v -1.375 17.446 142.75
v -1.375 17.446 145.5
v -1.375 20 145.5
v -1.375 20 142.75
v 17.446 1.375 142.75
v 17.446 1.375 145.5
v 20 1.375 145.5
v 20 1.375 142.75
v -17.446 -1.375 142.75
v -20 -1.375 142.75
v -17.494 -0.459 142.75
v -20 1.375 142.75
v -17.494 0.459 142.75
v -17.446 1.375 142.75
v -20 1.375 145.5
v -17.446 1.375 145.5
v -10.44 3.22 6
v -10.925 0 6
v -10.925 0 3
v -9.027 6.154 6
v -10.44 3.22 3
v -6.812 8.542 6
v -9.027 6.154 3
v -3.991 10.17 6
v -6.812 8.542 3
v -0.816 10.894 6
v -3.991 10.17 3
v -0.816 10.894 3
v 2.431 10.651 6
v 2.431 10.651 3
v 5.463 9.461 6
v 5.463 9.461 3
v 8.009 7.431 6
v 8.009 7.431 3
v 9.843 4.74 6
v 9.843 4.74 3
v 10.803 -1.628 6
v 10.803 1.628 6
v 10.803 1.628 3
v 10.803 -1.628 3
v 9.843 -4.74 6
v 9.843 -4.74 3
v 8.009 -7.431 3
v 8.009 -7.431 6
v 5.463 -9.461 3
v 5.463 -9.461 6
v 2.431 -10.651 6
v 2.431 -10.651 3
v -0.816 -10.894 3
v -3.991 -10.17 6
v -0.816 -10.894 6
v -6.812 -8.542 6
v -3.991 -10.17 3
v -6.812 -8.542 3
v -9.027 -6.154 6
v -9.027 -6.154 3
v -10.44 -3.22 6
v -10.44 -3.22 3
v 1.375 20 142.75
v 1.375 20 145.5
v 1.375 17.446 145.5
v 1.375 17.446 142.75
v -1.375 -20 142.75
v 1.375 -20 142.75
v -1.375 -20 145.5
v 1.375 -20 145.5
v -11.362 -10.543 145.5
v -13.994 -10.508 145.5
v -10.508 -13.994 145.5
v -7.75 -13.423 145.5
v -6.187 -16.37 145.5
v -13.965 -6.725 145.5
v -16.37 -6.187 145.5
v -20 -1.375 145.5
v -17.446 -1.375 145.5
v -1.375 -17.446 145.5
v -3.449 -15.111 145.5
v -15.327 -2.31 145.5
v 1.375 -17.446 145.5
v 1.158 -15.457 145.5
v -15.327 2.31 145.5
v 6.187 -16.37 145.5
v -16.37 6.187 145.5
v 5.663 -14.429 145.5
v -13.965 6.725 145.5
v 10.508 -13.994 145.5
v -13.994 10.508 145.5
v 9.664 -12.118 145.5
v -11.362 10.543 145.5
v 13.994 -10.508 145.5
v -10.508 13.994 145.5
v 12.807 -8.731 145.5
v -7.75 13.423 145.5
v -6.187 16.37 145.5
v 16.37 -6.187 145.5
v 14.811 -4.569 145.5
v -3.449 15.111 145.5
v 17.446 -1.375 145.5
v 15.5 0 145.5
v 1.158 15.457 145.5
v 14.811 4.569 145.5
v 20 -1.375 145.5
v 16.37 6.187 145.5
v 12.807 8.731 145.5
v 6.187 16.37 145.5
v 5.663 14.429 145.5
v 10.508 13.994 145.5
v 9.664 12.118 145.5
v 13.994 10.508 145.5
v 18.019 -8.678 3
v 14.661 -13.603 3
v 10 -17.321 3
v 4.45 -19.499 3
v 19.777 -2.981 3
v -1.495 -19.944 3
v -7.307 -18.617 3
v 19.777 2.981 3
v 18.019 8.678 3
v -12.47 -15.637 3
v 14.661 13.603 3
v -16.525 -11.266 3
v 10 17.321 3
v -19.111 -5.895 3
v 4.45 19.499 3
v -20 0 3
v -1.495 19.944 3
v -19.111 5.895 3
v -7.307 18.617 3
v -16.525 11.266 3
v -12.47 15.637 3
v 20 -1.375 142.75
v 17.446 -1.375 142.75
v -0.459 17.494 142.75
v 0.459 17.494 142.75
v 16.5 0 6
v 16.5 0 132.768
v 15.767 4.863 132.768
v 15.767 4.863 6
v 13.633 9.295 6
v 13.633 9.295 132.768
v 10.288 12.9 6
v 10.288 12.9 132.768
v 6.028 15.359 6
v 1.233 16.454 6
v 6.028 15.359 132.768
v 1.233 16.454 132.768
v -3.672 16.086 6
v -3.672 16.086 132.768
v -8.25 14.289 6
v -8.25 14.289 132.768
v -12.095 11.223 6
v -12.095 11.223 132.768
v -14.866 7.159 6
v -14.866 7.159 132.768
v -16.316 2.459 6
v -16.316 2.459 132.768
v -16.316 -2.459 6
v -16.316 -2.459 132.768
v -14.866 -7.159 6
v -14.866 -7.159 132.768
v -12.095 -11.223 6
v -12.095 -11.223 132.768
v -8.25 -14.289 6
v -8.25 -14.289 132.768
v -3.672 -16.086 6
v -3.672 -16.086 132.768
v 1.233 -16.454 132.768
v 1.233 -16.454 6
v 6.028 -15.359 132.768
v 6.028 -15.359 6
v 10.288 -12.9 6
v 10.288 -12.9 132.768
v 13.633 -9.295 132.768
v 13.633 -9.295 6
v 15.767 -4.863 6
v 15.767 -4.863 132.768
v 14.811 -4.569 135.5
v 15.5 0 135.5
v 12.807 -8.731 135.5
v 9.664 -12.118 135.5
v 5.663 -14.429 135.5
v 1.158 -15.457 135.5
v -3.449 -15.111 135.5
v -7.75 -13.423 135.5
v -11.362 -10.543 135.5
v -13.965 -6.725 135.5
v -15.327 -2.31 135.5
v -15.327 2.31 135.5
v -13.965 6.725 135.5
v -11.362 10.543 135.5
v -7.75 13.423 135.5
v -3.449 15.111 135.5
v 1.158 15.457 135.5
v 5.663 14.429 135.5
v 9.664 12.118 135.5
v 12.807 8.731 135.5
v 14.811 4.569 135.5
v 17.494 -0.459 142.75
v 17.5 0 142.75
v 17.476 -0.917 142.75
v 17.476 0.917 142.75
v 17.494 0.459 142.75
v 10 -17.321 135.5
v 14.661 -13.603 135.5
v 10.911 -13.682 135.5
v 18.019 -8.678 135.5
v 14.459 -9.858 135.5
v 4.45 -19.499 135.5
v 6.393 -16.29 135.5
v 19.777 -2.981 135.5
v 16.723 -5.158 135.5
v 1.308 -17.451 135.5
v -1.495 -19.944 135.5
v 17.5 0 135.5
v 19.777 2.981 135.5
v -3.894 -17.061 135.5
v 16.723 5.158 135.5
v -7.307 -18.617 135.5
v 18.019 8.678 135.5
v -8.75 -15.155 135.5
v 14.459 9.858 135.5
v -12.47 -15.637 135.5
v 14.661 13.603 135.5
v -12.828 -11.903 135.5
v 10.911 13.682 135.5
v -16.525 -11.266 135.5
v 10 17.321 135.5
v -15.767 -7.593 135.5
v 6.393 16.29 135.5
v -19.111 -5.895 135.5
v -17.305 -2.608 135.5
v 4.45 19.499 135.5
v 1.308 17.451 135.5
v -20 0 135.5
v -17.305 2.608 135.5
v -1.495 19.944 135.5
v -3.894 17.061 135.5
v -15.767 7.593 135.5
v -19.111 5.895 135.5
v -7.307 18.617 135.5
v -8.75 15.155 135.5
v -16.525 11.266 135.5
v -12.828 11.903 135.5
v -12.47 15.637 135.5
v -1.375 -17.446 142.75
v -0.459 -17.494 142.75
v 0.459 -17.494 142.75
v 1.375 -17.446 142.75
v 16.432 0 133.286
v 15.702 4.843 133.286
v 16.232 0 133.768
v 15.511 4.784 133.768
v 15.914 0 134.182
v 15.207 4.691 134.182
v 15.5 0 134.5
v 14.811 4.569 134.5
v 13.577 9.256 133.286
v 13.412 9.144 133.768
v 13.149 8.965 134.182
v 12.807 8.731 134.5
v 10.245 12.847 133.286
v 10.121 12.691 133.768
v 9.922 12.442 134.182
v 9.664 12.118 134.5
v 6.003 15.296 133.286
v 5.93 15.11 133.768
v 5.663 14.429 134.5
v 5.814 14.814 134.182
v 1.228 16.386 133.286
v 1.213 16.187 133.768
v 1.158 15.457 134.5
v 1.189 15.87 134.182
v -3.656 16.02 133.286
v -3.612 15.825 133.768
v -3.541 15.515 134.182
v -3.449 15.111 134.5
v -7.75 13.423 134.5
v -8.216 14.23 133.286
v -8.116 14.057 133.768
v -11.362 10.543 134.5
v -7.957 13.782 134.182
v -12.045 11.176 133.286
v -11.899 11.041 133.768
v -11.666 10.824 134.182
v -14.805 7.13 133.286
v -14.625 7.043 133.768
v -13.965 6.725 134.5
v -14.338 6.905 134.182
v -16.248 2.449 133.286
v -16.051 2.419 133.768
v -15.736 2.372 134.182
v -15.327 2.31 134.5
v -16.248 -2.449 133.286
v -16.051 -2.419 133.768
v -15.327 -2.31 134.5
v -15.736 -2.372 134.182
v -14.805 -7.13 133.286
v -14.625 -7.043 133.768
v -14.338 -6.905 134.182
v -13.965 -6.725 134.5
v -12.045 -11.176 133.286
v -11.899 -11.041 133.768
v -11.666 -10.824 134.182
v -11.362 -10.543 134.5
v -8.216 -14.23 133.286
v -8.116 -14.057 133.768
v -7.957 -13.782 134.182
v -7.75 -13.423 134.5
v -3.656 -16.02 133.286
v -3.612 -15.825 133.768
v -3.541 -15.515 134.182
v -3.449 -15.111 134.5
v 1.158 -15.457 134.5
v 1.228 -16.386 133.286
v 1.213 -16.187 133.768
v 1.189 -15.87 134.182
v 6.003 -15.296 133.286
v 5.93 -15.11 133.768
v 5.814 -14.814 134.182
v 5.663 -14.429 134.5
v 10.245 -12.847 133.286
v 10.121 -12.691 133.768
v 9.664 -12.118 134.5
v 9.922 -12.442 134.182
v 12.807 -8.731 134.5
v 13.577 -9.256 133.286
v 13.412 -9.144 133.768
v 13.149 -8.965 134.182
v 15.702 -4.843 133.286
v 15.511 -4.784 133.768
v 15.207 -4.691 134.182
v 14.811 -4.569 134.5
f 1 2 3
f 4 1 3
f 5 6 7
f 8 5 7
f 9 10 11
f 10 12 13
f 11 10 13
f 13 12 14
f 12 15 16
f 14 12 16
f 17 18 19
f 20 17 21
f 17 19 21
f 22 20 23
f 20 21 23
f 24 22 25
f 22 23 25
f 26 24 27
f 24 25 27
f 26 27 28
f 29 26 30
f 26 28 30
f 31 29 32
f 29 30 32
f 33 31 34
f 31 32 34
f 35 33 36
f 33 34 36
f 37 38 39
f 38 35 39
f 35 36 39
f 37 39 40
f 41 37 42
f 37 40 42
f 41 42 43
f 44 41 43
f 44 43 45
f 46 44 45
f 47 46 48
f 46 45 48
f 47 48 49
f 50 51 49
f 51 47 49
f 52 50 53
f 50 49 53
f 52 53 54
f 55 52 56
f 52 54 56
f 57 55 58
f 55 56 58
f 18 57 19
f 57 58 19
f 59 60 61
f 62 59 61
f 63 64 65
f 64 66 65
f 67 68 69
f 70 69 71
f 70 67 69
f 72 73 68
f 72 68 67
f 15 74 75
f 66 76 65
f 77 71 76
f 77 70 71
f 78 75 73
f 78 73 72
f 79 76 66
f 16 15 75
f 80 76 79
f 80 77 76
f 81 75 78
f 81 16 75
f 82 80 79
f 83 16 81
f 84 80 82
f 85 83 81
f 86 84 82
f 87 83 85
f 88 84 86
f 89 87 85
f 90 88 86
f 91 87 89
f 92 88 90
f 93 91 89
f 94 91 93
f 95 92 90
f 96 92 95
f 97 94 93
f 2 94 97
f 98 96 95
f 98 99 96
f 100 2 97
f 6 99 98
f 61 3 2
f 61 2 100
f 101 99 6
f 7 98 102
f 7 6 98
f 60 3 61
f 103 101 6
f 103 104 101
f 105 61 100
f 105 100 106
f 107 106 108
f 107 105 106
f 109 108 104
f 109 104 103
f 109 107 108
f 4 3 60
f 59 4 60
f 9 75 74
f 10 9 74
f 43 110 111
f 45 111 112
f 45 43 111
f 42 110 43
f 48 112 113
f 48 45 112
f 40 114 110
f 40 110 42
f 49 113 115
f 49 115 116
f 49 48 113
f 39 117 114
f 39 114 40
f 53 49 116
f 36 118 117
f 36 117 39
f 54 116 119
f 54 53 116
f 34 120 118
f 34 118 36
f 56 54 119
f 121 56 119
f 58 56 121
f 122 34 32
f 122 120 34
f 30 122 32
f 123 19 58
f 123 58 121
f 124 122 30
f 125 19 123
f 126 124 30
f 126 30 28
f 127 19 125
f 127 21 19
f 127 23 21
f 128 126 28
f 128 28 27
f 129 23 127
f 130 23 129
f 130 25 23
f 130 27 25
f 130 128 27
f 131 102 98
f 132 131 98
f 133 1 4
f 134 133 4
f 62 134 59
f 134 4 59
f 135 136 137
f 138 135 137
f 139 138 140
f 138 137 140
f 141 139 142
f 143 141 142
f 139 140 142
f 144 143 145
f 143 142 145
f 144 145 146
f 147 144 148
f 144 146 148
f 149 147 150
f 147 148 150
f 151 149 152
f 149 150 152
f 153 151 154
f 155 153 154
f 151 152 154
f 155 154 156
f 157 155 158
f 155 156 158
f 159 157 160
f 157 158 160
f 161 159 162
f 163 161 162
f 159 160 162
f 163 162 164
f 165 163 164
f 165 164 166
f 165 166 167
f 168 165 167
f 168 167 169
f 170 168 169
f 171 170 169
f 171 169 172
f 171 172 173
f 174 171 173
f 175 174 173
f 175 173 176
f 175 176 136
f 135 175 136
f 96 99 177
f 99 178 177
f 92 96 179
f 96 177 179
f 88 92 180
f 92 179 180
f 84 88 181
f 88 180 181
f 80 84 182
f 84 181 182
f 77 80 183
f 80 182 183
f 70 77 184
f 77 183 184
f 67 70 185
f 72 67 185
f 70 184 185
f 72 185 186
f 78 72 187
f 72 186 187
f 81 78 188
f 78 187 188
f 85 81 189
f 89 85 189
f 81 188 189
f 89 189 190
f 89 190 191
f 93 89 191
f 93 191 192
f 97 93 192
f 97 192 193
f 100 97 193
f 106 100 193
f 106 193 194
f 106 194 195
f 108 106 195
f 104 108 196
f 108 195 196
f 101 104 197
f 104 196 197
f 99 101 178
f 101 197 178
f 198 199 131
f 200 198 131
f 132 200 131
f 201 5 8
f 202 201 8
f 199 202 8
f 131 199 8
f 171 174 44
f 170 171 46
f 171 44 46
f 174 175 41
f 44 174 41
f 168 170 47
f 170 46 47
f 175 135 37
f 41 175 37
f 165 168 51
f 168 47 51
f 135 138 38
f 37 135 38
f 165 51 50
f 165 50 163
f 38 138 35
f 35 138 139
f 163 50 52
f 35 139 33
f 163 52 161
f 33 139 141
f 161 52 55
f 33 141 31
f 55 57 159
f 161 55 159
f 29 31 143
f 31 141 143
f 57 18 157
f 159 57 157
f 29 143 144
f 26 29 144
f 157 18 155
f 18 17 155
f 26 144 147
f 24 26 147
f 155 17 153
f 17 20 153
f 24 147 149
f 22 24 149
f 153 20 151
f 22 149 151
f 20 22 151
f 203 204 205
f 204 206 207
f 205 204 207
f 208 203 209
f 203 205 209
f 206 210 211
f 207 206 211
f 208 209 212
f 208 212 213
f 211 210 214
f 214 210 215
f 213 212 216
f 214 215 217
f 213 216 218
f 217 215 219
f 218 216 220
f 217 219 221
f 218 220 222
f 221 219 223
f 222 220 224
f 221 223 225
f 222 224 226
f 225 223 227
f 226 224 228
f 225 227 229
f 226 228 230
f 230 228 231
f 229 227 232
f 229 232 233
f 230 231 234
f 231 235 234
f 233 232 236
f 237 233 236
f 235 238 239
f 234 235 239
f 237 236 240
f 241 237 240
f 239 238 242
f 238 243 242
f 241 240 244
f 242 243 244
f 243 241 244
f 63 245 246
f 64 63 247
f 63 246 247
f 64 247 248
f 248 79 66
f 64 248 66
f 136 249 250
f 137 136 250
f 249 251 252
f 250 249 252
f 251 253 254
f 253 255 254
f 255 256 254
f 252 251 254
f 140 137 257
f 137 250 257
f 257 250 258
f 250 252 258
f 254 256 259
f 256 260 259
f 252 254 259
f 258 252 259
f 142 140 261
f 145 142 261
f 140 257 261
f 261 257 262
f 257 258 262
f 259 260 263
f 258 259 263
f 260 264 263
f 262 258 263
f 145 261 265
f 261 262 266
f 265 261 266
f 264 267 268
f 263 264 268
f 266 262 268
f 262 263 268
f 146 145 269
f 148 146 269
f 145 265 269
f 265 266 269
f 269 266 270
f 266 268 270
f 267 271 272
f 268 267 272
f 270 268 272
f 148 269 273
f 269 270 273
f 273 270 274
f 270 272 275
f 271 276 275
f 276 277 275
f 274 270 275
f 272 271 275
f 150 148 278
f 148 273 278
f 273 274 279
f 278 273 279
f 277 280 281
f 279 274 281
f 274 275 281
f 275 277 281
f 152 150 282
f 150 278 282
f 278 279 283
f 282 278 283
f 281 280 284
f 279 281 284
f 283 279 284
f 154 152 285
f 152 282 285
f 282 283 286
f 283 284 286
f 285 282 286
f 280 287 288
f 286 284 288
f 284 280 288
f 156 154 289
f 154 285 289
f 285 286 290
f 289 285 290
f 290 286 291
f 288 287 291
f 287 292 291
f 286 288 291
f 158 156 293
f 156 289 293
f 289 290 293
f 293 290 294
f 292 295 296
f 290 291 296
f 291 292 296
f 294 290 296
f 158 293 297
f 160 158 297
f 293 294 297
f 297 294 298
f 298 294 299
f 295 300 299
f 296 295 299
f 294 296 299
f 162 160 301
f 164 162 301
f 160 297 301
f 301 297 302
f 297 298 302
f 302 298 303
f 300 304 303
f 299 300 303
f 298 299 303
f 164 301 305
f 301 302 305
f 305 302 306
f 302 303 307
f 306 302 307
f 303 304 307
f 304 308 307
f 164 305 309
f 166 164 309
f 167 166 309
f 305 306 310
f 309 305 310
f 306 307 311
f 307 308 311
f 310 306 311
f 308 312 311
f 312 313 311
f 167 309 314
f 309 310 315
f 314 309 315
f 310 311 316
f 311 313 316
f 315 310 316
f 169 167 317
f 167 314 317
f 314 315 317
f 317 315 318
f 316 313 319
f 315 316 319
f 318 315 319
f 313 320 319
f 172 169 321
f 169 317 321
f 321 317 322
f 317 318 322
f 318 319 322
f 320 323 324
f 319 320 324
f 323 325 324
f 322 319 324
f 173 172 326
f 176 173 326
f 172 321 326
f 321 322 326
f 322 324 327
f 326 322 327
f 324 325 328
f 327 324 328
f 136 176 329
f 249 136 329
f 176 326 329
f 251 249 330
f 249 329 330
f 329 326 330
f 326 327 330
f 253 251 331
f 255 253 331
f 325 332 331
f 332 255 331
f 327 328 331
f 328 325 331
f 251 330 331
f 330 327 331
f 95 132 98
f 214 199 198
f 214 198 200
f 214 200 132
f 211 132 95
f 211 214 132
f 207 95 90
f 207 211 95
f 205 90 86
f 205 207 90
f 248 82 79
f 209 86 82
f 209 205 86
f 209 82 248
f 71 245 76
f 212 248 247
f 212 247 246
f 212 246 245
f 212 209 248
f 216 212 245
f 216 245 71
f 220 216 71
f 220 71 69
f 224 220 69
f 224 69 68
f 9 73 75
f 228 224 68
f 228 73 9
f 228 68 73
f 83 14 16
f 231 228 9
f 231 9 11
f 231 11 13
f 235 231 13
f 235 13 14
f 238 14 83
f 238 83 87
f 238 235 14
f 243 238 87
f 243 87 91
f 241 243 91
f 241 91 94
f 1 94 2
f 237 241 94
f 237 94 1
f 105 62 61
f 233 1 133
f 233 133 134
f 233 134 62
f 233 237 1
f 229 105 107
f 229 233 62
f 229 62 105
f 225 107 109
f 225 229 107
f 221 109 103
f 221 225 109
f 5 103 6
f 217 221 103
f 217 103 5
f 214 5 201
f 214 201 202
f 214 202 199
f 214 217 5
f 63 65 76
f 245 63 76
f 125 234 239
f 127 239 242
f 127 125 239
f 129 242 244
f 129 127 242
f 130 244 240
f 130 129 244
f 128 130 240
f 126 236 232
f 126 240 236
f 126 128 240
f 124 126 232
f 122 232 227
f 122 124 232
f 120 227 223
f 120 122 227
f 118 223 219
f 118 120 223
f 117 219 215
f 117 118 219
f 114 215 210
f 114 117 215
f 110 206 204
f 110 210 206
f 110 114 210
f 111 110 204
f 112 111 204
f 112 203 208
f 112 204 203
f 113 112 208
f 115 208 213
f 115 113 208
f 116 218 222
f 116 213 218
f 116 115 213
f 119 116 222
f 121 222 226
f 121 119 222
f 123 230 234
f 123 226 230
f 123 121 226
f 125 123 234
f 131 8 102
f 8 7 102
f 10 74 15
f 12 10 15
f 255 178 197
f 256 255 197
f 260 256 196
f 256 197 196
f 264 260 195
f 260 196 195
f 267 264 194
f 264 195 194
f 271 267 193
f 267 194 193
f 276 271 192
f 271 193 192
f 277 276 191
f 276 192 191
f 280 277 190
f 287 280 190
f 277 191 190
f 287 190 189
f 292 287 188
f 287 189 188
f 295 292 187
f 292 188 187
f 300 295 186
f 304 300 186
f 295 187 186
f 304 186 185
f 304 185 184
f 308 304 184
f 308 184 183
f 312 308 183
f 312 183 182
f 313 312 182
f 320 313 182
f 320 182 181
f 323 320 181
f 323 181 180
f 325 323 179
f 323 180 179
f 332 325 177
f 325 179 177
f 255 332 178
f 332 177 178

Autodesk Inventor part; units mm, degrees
ref_plane "YZ Plane" through (0, 0, 0) normal (1, 0, 0) x (0, 1, 0)
ref_plane "XZ Plane" through (0, 0, 0) normal (0, 1, 0) x (-1, 0, 0)
ref_plane "XY Plane" through (0, 0, 0) normal (0, 0, 1) x (1, 0, 0)
sketch "Boceto1" plane through (0, 0, 0) normal (0, 0, 1) x (1, 0, 0)
  circle A0 centre (0, 0) radius 15
  dimension "d0" = 30
extrude "Extrusión1" add sketch "Boceto1" along normal blind 145.5
sketch "Boceto2" plane through (0, 0, 145.5) normal (0, 0, 1) x (1, 0, 0)
  circle A0 centre (0, 0) radius 12.5
  circle A1 centre (0, 0) radius 15
  dimension "d5" = 25
extrude "Extrusión2" cut sketch "Boceto2" against normal blind 10
sketch "Boceto3" plane through (0, 0, 145.5) normal (0, 0, 1) x (1, 0, 0)
  circle A0 centre (0, 0) radius 10
  dimension "d8" = 20
extrude "Extrusión3" cut sketch "Boceto3" against normal blind 145.5
sketch "Boceto4" plane through (0, 0, 145.5) normal (0, 0, 1) x (1, 0, 0)
  circle A0 centre (0, 0) radius 15
  circle A1 centre (0, 0) radius 12.5 projected
  line L0 (-14.9345, 1.4) -> (-12.4214, 1.4)
  line L1 (-12.4214, 1.4) -> (-12.4214, -1.4)
  line L2 (-12.4214, -1.4) -> (-14.9345, -1.4)
  line L3 (-15.0786, 1.4) -> (-12.4214, -1.4) construction
  line L4 (-12.4214, 1.4) -> (-14.9469, -1.2612) construction
  line L5 (-1.4, -14.9345) -> (-1.4, -12.4214)
  line L6 (-1.4, -12.4214) -> (1.4, -12.4214)
  line L7 (1.4, -12.4214) -> (1.4, -14.9345)
  line L8 (-1.4, -15.0786) -> (1.4, -12.4214) construction
  line L9 (-1.4, -12.4214) -> (1.2612, -14.9469) construction
  line L10 (14.9345, -1.4) -> (12.4214, -1.4)
  line L11 (12.4214, -1.4) -> (12.4214, 1.4)
  line L12 (12.4214, 1.4) -> (14.9345, 1.4)
  line L13 (15.0786, -1.4) -> (12.4214, 1.4) construction
  line L14 (12.4214, -1.4) -> (14.9469, 1.2612) construction
  line L15 (1.4, 14.9345) -> (1.4, 12.4214)
  line L16 (1.4, 12.4214) -> (-1.4, 12.4214)
  line L17 (-1.4, 12.4214) -> (-1.4, 14.9345)
  line L18 (1.4, 15.0786) -> (-1.4, 12.4214) construction
  line L19 (1.4, 12.4214) -> (-1.2612, 14.9469) construction
  point P0 (-13.75, 0)
  point P1 (0, -13.75)
  point P2 (13.75, 0)
  point P3 (0, 13.75)
  dimension "d12" = 2.8
  dimension "d15" = 360
extrude "Extrusión4" add sketch "Boceto4" against normal blind 2.8 contours A0 L10 A1 L12 | L15 A1 L17 A0 | A0 L5 A1 L7 | L0 A1 L2 A0
sketch "Boceto5" plane through (0, 0, 0) normal (0, 0, -1) x (-1, 0, 0)
  circle A0 centre (0, 0) radius 12.5
  circle A1 centre (0, 0) radius 10
extrude "Extrusión5" cut sketch "Boceto5" against normal blind 133
fillet "Empalme1" radius 2.5 1 edges at (12.5, 0, 133)
sketch "Boceto6" plane through (0, 0, 0) normal (0, 0, -1) x (-1, 0, 0)
  circle A0 centre (0, 0) radius 12.5 projected
  circle A1 centre (0, 0) radius 12.5
  circle A2 centre (0, 0) radius 10.925
  dimension "d22" = 21.85
extrude "Extrusión6" add sketch "Boceto6" against normal blind 5
sketch "Boceto7" plane through (0, 0, 0) normal (0, 0, -1) x (-1, 0, 0)
  circle A0 centre (0, 0) radius 17.5
  circle A1 centre (0, 0) radius 15
  dimension "d25" = 35
  dimension "d28" = 30
extrude "Extrusión7" add sketch "Boceto7" against normal blind 135.5
sketch "Boceto9" plane through (0, 0, 0) normal (0, 0, -1) x (-1, 0, 0)
  circle A0 centre (0, 0) radius 16.5
  dimension "d29" = 33
extrude "Extrusión8" cut sketch "Boceto9" against normal blind 135.5
sketch "Boceto10" plane through (0, 0, 0) normal (0, 0, -1) x (-1, 0, 0)
  circle A0 centre (0, 0) radius 16.5
  circle A1 centre (0, 0) radius 10.925
  dimension "d32" = 21.85
extrude "Extrusión9" add sketch "Boceto10" against normal blind 5
sketch "Boceto11" plane through (0, 0, 0) normal (0, 0, -1) x (-1, 0, 0)
  circle A0 centre (0, 0) radius 17.5 projected
  circle A1 centre (0, 0) radius 20
  circle A2 centre (0, 0) radius 17.5
  dimension "d35" = 40
  dimension "d36" = 35
extrude "Extrusión10" add sketch "Boceto11" against normal blind 135.5
sketch "Boceto12" plane through (0, 0, 135.5) normal (0, 0, 1) x (1, 0, 0)
  circle A0 centre (0, 0) radius 17.5
  circle A1 centre (0, 0) radius 16.5
  dimension "d39" = 35
extrude "Extrusión11" cut sketch "Boceto12" against normal blind 134
sketch "Boceto13" plane through (0, 0, 145.5) normal (0, 0, 1) x (1, 0, 0)
  circle A0 centre (0, 0) radius 15.5
  circle A1 centre (0, 0) radius 17.5
  dimension "d42" = 31
extrude "Extrusión12" cut sketch "Boceto13" against normal blind 10 contours A0
sketch "Boceto14" plane through (0, 0, 135.5) normal (0, 0, 1) x (1, 0, 0)
  circle A0 centre (0, 0) radius 17.5
  circle A1 centre (0, 0) radius 15.5
  dimension "d45" = 31
extrude "Extrusión13" add sketch "Boceto14" along normal blind 10
sketch "Boceto15" plane through (0, 0, 145.5) normal (0, 0, 1) x (1, 0, 0)
  line L0 (-20, 1.375) -> (-16.4197, 1.375)
  line L1 (-16.4426, -1.375) -> (-20, -1.375)
  line L2 (-20, -1.375) -> (-20, 1.375)
  circle A0 centre (0, 0) radius 17.5 projected
  line L3 (-16.4197, 1.375) -> (-16.4426, -1.375)
  circle A1 centre (0, 0) radius 16.5 projected
  line L4 (-1.375, -20) -> (-1.375, -16.4197)
  line L5 (1.375, -16.4426) -> (1.375, -20)
  line L6 (1.375, -20) -> (-1.375, -20)
  line L7 (-1.375, -16.4197) -> (1.375, -16.4426)
  line L8 (20, -1.375) -> (16.4197, -1.375)
  line L9 (16.4426, 1.375) -> (20, 1.375)
  line L10 (20, 1.375) -> (20, -1.375)
  line L11 (16.4197, -1.375) -> (16.4426, 1.375)
  line L12 (1.375, 20) -> (1.375, 16.4197)
  line L13 (-1.375, 16.4426) -> (-1.375, 20)
  line L14 (-1.375, 20) -> (1.375, 20)
  line L15 (1.375, 16.4197) -> (-1.375, 16.4426)
  point P0 (-17.5, 0)
  point P1 (0, -17.5)
  point P2 (17.5, 0)
  point P3 (0, 17.5)
  dimension "d52" = 360
extrude "Extrusión14" add sketch "Boceto15" against normal blind 2.75 contours L0 A0 L1 L2 | L0 A1 L1 A0 | L0 L3 A1 | L13 L14 L12 A0 | A0 L12 A1 L13 | A1 L12 L15 | L4 A1 L5 A0 | A0 L5 L6 L4 | L4 L7 A1 | L9 L10 L8 A0 | A0 L8 A1 L9 | A1 L8 L11
sketch "Boceto16" plane through (0, 0, 0) normal (0, 0, -1) x (-1, 0, 0)
  circle A0 centre (0, 0) radius 20 projected
  circle A1 centre (0, 0) radius 10.925 projected
extrude "Extrusión15" cut sketch "Boceto16" against normal blind 1
sketch "Boceto17" plane through (0, 0, 1) normal (0, 0, -1) x (-1, 0, 0)
  circle A0 centre (0, 0) radius 17.5
  dimension "d58" = 35
extrude "Extrusión16" cut sketch "Boceto17" against normal blind 20
sketch "Boceto18" plane through (0, 0, 1) normal (0, 0, -1) x (-1, 0, 0)
  circle A0 centre (0, 0) radius 17.5
  circle A1 centre (0, 0) radius 10.925
  dimension "d61" = 21.85
  dimension "d62" = 35
extrude "Extrusión17" add sketch "Boceto18" against normal blind 5
sketch "Boceto19" plane through (0, 0, 1) normal (0, 0, -1) x (-1, 0, 0)
  circle A0 centre (0, 0) radius 10.925 projected
  circle A1 centre (0, 0) radius 20 projected
extrude "Extrusión18" cut sketch "Boceto19" against normal blind 2
thicken "Engrosado1" operation add thickness 1 both sides no extend neighbours no toward (-0.9870503, 0.1604113, 0) faces at (17.2734, -2.8072, 92.3333) (16.5137, -2.6325, 135.5)
fillet "Empalme2" radius 2 1 edges at (-16.5, 0, 134.5)
equation "\"Radio_pliegue\" = Grosor"
equation "\"Anchura_desahogo_plegado\" = Grosor"
equation "\"Profundidad_desahogo_plegado\" = 0.5 * Grosor"
equation "\"Tamaño_destalonado\" = 4 * Grosor"
equation "\"Remanente_mínimo\" = 2 * Grosor"
equation "\"Radiodetransición\" = Radio_pliegue"
equation "\"Tamaño_de_radio_de_Jacobi\" = Radio_pliegue"
equation "\"TamañoSeparación\" = Grosor"
equation "\"Grosor\" = 0.5"
properties part number "HERRAMIENTA_p2" material "Plástico PET"
